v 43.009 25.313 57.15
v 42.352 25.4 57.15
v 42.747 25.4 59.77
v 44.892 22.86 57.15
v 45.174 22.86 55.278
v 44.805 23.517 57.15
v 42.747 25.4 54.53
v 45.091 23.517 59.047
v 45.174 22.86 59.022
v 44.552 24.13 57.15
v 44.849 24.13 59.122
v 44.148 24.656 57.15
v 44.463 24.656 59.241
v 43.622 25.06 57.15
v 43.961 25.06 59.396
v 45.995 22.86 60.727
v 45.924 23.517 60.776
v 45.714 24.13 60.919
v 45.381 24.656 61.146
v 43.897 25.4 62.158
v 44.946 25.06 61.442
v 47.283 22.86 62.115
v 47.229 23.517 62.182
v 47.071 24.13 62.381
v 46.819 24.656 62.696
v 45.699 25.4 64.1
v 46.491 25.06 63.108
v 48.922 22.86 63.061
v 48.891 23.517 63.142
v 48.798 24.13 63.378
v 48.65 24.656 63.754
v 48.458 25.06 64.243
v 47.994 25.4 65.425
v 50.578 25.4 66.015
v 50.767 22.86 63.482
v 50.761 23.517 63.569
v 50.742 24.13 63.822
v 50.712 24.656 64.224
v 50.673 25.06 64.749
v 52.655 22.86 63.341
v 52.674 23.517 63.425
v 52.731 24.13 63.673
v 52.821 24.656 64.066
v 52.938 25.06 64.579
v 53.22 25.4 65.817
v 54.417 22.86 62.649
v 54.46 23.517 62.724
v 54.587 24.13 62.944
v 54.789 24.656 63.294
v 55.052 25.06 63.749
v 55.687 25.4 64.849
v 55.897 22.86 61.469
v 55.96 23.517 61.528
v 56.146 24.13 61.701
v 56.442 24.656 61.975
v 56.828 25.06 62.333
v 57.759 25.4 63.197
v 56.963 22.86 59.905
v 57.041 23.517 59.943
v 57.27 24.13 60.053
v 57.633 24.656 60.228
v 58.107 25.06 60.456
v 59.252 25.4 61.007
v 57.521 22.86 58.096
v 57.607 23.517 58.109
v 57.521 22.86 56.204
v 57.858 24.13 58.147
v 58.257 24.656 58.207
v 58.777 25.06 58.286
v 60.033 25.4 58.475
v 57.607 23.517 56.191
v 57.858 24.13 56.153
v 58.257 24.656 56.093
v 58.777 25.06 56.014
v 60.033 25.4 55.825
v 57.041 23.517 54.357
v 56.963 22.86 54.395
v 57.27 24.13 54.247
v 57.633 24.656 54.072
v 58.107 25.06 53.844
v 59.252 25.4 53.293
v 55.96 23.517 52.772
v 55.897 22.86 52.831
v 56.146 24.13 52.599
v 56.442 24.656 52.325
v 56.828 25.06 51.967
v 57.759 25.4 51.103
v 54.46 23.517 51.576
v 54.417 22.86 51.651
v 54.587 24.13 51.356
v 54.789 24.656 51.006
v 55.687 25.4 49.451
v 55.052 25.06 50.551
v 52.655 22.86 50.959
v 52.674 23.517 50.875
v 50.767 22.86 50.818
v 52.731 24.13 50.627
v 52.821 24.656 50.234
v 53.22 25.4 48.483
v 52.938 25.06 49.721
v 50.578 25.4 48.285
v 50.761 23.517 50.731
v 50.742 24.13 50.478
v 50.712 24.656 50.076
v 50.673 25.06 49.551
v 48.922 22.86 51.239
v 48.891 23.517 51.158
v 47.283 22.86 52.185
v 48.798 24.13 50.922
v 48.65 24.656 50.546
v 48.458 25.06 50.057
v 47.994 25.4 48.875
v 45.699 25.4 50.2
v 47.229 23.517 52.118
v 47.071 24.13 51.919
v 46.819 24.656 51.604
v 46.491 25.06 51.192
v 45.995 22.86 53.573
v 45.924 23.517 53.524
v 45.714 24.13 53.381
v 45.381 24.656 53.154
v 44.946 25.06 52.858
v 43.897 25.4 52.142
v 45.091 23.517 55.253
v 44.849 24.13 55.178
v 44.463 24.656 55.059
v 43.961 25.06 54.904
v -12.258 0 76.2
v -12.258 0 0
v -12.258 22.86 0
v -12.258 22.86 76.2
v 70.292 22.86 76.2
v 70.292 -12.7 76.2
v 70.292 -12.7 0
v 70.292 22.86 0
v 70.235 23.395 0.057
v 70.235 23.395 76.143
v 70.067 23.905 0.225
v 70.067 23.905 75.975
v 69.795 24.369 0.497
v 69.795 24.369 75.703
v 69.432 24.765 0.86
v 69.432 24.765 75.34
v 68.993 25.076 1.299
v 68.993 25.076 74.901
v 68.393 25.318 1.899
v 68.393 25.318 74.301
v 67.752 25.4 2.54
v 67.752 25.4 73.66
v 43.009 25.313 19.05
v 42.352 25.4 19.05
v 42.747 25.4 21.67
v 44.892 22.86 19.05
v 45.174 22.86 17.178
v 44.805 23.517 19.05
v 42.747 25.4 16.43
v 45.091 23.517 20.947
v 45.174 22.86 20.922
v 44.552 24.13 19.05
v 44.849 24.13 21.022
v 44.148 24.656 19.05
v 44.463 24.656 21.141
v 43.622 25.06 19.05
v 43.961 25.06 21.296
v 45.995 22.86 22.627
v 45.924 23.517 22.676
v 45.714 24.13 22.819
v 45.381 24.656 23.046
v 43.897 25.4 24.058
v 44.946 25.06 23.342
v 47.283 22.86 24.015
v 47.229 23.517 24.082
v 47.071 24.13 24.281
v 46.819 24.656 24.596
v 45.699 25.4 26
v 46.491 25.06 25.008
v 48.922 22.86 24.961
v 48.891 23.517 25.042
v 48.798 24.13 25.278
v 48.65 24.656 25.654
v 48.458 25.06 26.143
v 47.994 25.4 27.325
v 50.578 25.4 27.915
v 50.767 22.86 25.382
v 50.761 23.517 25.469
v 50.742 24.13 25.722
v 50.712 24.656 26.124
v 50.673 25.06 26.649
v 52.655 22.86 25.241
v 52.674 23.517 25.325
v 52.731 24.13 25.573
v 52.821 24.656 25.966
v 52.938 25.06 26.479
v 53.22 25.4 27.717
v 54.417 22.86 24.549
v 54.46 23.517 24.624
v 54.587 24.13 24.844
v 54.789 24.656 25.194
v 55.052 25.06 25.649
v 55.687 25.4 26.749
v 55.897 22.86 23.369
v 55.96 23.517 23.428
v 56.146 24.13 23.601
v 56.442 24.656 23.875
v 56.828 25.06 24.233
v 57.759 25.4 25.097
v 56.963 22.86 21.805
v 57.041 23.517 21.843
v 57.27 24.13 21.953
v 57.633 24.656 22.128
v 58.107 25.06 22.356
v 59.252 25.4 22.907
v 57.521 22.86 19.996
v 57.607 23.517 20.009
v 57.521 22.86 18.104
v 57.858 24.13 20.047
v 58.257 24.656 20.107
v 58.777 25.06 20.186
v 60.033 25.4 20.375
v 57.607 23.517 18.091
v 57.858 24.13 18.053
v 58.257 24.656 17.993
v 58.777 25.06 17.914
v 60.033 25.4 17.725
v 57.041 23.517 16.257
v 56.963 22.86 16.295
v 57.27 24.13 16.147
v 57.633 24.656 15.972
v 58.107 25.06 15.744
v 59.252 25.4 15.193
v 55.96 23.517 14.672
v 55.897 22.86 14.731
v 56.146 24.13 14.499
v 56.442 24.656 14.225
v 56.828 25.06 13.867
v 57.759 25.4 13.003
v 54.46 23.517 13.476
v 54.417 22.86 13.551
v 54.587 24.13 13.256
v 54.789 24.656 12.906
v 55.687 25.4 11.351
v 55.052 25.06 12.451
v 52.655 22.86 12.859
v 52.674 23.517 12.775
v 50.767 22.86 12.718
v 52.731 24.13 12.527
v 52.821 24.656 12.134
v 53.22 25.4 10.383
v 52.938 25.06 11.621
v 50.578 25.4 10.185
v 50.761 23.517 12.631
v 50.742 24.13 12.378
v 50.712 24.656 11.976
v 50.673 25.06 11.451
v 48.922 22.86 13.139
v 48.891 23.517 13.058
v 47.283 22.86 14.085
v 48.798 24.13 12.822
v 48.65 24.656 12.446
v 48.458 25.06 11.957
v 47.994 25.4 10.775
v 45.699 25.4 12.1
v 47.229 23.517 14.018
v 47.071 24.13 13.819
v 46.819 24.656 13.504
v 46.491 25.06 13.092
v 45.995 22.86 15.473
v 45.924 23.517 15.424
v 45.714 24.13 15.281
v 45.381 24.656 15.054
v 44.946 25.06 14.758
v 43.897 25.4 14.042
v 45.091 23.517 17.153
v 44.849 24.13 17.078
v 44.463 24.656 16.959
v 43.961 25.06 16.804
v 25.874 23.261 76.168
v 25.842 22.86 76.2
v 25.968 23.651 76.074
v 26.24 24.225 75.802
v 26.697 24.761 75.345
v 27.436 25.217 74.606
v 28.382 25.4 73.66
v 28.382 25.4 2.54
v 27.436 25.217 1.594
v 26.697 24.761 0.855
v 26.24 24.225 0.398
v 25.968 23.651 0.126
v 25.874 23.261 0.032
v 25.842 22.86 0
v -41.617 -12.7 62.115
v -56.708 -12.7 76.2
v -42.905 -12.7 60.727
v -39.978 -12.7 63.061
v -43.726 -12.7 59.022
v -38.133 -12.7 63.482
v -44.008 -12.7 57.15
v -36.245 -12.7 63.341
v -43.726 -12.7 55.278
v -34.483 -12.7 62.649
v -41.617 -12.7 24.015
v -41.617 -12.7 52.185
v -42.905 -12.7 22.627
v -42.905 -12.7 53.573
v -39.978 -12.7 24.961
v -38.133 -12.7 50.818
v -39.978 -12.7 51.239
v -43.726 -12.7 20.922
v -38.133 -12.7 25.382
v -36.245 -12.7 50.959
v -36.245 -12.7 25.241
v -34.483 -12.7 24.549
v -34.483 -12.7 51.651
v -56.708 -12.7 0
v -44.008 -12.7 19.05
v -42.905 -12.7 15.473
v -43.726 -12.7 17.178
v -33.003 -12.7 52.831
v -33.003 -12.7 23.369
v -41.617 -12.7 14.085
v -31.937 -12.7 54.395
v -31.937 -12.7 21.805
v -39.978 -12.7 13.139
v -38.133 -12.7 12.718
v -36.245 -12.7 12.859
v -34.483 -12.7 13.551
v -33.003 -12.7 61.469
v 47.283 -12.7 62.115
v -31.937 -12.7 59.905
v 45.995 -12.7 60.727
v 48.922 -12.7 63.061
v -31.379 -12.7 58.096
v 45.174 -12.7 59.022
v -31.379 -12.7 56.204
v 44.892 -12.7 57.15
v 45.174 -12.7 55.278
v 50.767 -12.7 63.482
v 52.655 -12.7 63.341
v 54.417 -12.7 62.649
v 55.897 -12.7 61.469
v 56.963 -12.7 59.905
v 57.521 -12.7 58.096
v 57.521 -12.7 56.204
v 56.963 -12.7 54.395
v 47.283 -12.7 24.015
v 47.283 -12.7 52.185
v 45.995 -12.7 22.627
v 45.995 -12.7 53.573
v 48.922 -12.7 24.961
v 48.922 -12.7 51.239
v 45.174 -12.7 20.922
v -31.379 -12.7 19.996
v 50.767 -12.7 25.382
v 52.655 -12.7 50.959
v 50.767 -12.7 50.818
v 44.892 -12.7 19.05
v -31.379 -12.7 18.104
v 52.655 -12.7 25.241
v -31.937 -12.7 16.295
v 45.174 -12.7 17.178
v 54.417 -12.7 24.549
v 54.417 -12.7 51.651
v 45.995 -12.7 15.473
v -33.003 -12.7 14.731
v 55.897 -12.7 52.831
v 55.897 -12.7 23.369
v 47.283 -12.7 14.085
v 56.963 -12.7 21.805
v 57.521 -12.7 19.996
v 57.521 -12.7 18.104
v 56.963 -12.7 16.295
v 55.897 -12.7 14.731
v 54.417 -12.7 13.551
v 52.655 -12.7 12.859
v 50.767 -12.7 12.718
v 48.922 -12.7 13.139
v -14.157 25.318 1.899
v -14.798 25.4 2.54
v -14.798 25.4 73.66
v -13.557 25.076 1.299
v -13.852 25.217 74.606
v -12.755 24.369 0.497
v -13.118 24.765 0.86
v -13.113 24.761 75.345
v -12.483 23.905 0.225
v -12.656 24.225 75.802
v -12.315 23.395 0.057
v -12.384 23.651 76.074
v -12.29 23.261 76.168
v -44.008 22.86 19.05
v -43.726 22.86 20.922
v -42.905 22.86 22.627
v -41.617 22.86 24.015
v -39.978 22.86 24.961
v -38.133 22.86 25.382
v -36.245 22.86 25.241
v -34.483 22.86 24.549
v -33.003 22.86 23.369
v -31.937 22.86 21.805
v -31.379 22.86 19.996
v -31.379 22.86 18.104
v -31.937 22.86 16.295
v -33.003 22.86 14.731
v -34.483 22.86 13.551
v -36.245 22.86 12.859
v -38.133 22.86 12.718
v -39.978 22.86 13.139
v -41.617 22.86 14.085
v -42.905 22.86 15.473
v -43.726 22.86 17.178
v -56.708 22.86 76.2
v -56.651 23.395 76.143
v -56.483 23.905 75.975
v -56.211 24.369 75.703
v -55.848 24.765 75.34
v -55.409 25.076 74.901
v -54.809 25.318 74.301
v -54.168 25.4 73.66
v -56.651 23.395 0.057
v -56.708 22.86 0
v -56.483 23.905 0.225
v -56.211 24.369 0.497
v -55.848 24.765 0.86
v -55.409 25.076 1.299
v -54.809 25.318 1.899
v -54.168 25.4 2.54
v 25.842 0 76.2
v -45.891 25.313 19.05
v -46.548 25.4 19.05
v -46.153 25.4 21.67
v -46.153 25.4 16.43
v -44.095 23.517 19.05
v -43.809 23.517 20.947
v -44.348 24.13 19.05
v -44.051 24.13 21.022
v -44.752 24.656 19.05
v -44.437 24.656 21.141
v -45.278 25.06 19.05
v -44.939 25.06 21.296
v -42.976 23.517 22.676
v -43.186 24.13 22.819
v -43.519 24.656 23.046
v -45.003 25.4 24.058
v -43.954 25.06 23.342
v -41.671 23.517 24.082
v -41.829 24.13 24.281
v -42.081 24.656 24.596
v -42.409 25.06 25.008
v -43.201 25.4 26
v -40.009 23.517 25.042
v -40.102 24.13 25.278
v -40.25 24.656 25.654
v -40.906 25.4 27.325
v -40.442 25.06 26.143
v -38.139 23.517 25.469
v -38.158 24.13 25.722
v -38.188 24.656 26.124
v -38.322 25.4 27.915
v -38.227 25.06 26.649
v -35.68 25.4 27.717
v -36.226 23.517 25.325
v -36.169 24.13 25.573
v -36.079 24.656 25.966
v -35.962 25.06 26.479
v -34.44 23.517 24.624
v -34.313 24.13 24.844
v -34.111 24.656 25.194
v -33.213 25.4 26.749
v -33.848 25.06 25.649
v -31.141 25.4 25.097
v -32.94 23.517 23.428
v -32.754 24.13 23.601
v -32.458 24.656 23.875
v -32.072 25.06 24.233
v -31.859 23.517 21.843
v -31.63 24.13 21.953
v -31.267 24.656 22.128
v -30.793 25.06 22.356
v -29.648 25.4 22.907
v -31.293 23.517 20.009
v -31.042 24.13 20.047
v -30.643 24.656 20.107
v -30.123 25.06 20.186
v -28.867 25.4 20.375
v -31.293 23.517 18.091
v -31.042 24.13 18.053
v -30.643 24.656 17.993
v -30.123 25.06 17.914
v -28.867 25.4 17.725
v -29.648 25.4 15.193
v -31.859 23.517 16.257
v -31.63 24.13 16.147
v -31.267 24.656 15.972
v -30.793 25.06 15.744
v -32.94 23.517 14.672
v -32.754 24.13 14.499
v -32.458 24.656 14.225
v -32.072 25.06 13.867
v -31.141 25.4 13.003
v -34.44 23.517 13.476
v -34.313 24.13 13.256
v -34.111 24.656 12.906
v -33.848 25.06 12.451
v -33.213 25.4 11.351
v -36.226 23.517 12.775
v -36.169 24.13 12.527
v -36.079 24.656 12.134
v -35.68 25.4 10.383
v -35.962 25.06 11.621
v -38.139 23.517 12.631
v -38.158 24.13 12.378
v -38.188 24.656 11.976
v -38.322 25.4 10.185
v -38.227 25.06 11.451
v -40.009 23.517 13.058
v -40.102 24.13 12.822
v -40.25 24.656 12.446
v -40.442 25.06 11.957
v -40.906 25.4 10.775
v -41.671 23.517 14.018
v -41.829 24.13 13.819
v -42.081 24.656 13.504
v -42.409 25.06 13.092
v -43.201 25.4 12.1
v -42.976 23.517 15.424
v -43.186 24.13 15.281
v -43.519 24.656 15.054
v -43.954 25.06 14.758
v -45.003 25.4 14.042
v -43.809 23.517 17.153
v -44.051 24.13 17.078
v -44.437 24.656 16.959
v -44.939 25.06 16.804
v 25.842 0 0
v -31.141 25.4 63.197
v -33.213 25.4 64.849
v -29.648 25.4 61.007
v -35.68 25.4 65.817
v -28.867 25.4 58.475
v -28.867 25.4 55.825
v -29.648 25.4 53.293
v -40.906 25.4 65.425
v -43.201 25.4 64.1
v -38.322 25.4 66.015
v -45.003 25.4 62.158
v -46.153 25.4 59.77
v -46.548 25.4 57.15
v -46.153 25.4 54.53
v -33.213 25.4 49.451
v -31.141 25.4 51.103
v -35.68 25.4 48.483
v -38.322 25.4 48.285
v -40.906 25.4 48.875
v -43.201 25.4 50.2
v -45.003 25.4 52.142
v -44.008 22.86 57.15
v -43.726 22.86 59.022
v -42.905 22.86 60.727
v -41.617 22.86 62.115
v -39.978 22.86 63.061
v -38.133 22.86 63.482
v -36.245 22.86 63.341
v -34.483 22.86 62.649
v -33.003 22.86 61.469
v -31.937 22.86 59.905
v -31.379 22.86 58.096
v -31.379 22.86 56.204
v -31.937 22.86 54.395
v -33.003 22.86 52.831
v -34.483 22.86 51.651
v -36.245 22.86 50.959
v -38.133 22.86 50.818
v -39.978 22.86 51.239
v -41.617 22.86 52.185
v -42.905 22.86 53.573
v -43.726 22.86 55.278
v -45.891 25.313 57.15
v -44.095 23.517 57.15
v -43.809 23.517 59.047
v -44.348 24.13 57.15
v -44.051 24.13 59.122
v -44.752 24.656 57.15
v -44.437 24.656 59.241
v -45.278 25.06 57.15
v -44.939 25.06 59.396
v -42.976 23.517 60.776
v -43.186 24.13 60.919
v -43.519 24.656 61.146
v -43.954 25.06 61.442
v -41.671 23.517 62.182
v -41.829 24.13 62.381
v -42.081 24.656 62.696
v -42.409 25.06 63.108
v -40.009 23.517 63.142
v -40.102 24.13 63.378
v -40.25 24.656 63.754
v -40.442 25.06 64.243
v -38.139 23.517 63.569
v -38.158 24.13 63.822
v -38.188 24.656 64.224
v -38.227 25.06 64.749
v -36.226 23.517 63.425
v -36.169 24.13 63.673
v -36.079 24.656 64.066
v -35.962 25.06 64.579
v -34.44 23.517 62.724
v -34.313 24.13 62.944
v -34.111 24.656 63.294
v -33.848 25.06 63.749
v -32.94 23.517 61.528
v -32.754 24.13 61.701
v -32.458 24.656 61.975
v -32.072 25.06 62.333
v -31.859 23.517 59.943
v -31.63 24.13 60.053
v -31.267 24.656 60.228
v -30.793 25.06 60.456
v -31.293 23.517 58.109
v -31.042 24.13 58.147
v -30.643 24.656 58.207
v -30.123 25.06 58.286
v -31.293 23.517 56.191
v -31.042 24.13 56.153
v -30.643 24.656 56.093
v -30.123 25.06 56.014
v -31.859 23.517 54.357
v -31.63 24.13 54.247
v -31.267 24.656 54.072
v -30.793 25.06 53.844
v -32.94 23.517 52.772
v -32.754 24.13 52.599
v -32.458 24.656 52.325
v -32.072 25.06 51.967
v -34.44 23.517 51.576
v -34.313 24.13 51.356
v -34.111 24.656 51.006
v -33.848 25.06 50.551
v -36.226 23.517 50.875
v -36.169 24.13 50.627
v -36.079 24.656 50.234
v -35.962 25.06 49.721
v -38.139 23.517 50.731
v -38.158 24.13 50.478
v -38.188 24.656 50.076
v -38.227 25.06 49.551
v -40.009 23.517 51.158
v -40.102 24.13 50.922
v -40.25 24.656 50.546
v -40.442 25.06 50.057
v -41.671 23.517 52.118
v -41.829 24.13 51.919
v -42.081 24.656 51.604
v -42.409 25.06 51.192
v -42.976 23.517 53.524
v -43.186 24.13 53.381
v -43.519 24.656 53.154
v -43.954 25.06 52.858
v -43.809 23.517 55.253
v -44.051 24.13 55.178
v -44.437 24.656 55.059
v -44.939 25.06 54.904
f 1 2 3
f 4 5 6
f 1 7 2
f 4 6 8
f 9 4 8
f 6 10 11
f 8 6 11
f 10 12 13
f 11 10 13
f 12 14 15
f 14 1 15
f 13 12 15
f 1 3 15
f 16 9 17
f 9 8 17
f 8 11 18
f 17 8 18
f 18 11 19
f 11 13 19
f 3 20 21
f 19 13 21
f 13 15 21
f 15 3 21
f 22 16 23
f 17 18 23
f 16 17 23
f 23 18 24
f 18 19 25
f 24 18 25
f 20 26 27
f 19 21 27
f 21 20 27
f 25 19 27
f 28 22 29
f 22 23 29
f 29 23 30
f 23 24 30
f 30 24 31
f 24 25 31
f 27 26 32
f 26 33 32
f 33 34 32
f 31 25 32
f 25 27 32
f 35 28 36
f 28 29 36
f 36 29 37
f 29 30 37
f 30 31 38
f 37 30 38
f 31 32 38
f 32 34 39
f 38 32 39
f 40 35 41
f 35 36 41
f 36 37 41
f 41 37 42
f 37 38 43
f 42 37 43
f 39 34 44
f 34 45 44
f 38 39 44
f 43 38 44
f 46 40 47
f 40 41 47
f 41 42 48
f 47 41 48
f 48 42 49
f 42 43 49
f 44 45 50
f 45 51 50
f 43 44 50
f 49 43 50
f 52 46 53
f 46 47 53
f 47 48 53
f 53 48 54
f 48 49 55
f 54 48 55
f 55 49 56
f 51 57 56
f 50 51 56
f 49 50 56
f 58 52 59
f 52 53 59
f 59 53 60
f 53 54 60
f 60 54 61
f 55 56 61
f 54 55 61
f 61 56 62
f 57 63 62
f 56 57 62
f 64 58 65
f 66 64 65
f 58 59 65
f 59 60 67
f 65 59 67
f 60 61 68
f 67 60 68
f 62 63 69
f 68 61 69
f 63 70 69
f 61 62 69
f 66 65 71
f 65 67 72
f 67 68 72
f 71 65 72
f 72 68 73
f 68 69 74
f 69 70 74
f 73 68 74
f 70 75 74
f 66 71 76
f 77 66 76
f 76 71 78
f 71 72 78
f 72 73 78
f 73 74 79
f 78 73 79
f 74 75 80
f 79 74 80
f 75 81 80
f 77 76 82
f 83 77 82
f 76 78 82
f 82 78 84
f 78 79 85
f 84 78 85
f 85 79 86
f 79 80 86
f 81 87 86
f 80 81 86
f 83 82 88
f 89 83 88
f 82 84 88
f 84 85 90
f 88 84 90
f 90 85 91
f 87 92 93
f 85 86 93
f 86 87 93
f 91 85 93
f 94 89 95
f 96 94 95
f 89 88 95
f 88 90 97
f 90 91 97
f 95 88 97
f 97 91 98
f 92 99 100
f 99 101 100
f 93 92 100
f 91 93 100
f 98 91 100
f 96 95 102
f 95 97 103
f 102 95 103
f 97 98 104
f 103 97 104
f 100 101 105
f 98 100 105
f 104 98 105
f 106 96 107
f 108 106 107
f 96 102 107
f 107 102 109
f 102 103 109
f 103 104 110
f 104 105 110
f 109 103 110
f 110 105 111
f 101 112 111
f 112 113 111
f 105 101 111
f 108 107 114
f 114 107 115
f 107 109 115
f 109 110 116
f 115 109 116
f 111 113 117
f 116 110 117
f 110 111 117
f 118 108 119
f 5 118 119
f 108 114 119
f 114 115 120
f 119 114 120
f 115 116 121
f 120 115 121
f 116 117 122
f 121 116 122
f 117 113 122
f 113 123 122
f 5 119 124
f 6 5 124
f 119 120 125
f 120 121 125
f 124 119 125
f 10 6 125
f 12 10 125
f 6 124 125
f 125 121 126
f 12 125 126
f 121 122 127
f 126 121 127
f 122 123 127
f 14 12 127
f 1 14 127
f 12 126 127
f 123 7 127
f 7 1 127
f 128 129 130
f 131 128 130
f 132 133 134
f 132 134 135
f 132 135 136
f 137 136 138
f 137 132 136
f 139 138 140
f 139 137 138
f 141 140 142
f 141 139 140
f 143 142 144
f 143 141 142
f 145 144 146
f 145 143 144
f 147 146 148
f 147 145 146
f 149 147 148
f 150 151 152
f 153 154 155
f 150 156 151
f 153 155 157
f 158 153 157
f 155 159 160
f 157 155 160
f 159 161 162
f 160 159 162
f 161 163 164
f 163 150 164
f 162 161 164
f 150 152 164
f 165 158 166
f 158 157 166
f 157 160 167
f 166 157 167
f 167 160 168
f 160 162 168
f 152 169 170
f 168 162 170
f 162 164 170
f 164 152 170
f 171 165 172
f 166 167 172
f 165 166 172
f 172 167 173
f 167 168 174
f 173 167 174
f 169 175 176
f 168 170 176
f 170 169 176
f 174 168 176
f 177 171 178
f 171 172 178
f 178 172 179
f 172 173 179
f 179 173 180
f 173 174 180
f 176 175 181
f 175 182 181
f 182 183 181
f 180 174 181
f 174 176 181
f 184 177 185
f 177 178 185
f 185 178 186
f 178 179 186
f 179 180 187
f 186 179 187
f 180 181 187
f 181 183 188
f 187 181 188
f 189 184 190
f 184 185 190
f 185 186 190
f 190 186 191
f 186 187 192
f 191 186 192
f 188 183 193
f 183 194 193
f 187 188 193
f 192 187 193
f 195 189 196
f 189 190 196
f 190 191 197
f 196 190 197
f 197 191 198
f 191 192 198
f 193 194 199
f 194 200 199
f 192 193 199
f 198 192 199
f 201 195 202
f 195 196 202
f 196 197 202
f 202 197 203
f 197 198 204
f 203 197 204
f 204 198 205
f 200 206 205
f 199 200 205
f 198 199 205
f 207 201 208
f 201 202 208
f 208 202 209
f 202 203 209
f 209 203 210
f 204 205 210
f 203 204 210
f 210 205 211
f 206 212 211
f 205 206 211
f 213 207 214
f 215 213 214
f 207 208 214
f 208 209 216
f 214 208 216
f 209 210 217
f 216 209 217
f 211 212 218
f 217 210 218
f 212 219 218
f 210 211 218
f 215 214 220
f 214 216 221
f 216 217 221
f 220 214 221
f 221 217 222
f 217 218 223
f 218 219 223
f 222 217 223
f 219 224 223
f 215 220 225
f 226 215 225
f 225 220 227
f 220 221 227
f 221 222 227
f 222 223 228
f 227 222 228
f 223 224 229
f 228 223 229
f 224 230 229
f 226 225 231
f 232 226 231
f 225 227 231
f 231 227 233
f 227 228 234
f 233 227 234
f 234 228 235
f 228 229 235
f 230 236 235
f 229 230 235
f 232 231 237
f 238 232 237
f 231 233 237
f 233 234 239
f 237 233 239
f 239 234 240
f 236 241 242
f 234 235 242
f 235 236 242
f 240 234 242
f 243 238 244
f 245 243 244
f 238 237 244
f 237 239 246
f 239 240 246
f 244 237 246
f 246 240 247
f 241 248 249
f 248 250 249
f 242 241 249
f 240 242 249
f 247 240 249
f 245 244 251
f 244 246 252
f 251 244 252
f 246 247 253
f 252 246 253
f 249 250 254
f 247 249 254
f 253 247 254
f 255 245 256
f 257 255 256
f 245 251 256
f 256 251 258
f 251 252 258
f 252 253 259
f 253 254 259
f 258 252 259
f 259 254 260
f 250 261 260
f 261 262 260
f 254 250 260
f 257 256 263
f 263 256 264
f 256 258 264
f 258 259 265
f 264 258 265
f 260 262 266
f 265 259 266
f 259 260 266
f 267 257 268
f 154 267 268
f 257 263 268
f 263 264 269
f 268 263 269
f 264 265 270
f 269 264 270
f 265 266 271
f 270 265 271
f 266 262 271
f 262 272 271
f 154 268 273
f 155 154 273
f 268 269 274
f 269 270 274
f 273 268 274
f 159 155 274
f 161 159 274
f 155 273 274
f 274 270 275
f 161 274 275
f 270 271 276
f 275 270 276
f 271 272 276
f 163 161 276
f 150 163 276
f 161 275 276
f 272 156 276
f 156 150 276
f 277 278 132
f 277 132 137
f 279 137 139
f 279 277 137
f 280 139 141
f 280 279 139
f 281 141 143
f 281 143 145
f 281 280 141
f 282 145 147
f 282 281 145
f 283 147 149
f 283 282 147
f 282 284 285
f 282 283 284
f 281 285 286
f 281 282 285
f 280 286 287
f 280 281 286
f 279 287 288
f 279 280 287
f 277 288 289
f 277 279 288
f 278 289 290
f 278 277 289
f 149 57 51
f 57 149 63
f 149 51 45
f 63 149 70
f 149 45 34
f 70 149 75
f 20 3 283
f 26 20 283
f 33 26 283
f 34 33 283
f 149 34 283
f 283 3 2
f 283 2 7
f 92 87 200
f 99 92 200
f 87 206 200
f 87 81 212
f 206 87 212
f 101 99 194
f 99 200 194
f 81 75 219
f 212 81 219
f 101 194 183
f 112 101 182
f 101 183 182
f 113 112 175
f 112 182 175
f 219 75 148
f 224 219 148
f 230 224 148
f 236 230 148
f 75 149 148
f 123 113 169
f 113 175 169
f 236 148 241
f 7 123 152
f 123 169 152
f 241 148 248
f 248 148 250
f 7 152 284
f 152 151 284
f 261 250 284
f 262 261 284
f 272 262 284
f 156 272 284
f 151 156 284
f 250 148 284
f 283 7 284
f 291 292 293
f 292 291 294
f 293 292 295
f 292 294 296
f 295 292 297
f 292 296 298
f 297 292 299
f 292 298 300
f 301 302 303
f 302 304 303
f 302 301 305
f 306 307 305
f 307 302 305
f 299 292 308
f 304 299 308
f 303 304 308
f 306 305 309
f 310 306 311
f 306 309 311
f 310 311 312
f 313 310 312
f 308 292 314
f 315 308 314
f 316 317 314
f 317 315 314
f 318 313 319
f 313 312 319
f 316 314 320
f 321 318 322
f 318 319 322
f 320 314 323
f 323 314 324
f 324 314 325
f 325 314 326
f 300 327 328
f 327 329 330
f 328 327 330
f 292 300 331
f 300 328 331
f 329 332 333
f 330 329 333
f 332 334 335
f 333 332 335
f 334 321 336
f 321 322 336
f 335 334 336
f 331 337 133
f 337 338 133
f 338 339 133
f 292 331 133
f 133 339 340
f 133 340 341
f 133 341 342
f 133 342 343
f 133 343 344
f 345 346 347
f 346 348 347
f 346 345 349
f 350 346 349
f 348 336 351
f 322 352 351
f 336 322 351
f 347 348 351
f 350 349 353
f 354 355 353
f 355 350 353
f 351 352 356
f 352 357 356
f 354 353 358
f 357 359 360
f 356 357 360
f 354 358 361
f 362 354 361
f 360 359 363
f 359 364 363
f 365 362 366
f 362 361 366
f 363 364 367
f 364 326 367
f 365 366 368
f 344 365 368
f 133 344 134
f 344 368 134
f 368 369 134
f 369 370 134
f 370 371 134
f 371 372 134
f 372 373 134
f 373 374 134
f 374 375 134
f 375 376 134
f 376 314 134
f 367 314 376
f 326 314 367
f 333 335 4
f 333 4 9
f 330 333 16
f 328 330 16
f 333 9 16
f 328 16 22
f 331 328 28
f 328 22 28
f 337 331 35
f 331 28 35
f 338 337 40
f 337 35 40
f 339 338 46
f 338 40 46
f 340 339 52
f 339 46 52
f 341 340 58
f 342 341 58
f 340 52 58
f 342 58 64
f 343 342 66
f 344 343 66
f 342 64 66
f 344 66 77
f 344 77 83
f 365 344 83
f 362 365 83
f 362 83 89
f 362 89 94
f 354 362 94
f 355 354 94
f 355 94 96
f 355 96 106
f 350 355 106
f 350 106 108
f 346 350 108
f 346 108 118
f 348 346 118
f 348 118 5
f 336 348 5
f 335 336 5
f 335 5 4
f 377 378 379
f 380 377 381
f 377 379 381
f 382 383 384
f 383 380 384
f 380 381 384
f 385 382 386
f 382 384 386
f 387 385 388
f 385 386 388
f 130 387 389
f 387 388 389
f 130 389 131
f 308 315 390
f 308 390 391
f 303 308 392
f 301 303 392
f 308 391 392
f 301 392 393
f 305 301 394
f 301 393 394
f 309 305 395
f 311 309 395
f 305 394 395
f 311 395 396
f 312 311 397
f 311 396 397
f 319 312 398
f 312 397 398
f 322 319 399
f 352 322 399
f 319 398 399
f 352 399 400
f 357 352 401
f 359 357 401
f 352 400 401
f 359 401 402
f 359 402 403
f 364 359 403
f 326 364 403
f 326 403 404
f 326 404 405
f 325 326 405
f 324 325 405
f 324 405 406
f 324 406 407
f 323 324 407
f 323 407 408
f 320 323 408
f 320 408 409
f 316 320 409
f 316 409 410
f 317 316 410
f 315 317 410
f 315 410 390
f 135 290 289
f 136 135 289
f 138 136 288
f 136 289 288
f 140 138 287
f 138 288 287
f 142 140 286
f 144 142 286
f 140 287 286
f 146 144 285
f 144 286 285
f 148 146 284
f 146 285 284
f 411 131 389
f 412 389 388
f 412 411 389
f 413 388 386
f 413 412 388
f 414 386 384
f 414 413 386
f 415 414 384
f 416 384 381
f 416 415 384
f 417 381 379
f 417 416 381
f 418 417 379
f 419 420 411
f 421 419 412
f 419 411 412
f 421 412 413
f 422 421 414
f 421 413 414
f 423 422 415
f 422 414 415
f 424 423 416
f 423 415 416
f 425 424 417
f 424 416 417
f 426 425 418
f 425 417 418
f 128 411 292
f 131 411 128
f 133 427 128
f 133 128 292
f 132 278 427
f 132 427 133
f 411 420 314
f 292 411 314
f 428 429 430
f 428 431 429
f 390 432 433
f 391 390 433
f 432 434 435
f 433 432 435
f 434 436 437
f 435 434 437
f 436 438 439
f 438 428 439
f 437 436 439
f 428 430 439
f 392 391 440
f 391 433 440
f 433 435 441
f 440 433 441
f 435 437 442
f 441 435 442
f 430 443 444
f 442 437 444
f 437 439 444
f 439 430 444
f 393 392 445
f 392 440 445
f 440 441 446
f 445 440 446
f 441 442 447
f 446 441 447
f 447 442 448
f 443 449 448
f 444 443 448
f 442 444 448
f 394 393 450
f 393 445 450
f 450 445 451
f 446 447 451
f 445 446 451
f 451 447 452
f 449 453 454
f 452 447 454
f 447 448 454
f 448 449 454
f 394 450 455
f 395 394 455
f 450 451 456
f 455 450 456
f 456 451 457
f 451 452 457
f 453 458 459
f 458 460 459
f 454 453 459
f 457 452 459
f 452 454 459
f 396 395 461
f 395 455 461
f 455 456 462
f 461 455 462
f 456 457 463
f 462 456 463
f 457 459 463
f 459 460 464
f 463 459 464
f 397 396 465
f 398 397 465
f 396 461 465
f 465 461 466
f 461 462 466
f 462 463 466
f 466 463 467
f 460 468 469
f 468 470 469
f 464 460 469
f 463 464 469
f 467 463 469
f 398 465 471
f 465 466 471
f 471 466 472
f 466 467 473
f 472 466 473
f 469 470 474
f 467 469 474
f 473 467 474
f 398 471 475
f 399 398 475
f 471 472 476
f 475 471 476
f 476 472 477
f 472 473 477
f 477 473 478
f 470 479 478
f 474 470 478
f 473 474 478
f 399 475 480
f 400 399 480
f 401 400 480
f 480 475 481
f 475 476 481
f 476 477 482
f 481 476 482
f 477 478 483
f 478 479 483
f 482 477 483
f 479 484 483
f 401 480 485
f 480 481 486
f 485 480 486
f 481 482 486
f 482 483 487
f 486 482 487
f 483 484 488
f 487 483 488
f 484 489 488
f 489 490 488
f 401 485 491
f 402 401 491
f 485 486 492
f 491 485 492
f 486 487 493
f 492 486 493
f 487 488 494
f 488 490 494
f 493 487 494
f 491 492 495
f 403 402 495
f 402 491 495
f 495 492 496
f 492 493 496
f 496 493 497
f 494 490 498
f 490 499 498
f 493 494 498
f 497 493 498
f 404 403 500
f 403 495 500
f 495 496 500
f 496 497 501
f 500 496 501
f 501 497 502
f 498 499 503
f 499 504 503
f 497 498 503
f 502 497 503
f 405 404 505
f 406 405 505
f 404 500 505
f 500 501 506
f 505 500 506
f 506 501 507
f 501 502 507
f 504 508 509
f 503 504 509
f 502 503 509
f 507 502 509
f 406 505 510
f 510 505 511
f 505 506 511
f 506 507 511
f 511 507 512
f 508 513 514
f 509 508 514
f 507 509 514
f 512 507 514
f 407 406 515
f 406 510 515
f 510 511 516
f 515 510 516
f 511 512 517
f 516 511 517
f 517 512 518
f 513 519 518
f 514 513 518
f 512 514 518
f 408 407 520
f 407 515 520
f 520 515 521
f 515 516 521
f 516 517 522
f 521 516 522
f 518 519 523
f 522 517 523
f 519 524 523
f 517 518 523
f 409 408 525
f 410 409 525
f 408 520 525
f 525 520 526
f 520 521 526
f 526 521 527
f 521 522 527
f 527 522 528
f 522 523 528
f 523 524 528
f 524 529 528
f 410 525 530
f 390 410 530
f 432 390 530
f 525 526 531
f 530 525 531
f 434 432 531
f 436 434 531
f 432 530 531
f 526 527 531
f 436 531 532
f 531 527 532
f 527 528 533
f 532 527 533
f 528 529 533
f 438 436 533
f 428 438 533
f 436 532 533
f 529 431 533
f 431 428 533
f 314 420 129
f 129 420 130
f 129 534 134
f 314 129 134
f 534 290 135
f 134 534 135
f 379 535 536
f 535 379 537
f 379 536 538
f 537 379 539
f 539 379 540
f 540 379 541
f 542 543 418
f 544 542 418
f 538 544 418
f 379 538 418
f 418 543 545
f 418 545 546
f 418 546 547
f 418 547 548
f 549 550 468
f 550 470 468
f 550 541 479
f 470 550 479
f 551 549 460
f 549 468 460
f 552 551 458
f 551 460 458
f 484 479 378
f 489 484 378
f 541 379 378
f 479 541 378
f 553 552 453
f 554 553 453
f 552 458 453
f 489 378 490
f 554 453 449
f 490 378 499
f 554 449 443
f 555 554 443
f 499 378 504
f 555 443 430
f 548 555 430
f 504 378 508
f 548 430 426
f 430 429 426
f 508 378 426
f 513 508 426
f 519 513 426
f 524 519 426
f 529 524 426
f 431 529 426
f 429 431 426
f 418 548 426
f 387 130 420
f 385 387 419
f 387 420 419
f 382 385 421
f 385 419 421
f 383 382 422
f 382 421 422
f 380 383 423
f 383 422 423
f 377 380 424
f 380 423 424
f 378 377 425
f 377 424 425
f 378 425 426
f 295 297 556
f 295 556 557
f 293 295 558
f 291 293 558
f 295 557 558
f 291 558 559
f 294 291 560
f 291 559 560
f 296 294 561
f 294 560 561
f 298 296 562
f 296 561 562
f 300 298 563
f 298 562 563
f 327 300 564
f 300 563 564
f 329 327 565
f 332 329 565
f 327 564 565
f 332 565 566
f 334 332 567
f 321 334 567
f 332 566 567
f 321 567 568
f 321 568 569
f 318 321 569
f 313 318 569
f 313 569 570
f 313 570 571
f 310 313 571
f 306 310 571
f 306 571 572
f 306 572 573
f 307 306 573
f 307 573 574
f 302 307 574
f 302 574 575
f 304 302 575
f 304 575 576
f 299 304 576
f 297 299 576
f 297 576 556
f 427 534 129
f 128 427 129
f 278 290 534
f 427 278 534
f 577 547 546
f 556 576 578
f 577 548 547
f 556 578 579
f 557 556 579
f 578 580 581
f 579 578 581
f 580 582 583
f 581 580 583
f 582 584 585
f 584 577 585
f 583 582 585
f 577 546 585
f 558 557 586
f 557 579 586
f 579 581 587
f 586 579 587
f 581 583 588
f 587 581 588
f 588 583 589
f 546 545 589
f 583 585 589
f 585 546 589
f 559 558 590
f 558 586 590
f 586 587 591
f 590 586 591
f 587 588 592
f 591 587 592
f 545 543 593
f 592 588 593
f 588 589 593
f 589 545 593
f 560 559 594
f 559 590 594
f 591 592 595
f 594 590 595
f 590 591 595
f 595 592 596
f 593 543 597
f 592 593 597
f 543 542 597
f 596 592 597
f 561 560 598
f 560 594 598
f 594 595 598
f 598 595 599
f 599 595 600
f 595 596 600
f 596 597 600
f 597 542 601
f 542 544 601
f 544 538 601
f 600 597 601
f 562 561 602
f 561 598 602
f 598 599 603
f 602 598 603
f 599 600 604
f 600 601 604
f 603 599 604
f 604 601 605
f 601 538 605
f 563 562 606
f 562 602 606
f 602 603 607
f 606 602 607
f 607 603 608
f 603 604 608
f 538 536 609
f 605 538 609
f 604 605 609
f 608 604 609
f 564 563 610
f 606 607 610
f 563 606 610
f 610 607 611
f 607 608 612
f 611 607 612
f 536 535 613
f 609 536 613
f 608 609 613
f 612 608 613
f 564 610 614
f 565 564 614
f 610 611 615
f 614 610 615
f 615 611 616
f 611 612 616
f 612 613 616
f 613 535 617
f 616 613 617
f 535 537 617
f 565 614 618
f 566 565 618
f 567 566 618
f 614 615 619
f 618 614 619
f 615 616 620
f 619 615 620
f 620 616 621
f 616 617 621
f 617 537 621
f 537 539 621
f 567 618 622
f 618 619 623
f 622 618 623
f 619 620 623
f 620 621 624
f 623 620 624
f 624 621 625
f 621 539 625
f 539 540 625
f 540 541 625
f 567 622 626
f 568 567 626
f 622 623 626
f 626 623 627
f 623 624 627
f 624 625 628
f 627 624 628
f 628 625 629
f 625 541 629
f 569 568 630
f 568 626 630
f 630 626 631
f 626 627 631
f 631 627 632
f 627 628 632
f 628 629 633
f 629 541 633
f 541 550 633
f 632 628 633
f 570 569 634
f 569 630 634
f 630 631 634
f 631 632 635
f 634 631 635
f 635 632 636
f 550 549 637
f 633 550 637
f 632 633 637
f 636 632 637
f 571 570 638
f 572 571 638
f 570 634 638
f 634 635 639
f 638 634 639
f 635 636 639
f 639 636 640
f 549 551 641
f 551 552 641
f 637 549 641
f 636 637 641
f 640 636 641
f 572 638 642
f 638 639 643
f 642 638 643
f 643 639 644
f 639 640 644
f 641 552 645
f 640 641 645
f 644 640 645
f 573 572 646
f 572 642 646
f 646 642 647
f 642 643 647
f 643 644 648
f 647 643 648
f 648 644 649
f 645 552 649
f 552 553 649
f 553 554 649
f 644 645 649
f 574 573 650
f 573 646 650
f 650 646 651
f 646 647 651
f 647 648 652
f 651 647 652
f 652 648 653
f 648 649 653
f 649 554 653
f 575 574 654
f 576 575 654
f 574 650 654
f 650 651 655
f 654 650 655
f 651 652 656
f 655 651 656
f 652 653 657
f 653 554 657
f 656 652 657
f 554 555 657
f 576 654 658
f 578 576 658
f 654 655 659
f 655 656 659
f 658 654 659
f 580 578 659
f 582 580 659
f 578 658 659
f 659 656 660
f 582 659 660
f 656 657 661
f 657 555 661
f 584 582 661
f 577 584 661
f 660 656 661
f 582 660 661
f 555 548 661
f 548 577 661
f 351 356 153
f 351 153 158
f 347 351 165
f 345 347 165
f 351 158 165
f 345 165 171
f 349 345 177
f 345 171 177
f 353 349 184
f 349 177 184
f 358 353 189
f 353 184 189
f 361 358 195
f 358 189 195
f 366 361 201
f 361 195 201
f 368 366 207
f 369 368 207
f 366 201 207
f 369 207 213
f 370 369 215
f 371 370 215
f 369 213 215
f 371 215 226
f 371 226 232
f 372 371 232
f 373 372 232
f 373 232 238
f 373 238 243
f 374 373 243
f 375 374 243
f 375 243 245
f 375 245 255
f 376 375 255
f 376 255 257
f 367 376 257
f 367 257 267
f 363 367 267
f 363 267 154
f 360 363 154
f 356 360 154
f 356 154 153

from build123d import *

# Parameters (mm, degrees)
BOSS_EXTRUDE1_DEPTH = 76.2
SKETCH2_R           = 6.35
CUT_EXTRUDE1_DEPTH  = 111.449174947
FILLET1_R           = 2.54


with BuildPart() as part:
    # Sketch1 → Boss-Extrude1 (new body)
    with BuildSketch(Plane.XY):
        Polygon((-56.707964559, -12.7), (70.292035441, -12.7), (70.292035441, 25.4), (25.842035441, 25.4), (25.842035441, 0), (-12.257964559, 0), (-12.257964559, 25.4), (-56.707964559, 25.4), align=None)
    extrude(amount=BOSS_EXTRUDE1_DEPTH)

    # Sketch2 → Cut-Extrude1 (cut, through all)
    with BuildSketch(Plane(origin=(0, 25.4, 0), x_dir=(1, 0, 0), z_dir=(0, 1, 0))):
        with Locations(Location((-37.657964559, -19.05, 0), (0, 0, 180))):
            Circle(SKETCH2_R)
        with Locations(Location((-37.657964559, -57.15, 0), (0, 0, 180))):
            Circle(SKETCH2_R)
        with Locations(Location((51.242035441, -19.05, 0), (0, 0, 180))):
            Circle(SKETCH2_R)
        with Locations(Location((51.242035441, -57.15, 0), (0, 0, 180))):
            Circle(SKETCH2_R)
    extrude(amount=-CUT_EXTRUDE1_DEPTH, mode=Mode.SUBTRACT)

    # Fillet1
    fillet1_edges = [part.edges().sort_by_distance(p)[0] for p in [
        (-34.482964559, 25.4, 0),
        (-12.257964559, 25.4, 38.1),
        (25.842035441, 25.4, 38.1),
        (70.292035441, 25.4, 38.1),
        (-56.707964559, 25.4, 38.1),
        (48.067035441, 25.4, 76.2),
        (-31.307964559, 25.4, 57.15),
        (57.592035441, 25.4, 19.05),
        (57.592035441, 25.4, 57.15),
        (-31.307964559, 25.4, 19.05),
        (-34.482964559, 25.4, 76.2),
        (48.067035441, 25.4, 0),
    ]]
    fillet(fillet1_edges, radius=FILLET1_R)


solid = part.part
